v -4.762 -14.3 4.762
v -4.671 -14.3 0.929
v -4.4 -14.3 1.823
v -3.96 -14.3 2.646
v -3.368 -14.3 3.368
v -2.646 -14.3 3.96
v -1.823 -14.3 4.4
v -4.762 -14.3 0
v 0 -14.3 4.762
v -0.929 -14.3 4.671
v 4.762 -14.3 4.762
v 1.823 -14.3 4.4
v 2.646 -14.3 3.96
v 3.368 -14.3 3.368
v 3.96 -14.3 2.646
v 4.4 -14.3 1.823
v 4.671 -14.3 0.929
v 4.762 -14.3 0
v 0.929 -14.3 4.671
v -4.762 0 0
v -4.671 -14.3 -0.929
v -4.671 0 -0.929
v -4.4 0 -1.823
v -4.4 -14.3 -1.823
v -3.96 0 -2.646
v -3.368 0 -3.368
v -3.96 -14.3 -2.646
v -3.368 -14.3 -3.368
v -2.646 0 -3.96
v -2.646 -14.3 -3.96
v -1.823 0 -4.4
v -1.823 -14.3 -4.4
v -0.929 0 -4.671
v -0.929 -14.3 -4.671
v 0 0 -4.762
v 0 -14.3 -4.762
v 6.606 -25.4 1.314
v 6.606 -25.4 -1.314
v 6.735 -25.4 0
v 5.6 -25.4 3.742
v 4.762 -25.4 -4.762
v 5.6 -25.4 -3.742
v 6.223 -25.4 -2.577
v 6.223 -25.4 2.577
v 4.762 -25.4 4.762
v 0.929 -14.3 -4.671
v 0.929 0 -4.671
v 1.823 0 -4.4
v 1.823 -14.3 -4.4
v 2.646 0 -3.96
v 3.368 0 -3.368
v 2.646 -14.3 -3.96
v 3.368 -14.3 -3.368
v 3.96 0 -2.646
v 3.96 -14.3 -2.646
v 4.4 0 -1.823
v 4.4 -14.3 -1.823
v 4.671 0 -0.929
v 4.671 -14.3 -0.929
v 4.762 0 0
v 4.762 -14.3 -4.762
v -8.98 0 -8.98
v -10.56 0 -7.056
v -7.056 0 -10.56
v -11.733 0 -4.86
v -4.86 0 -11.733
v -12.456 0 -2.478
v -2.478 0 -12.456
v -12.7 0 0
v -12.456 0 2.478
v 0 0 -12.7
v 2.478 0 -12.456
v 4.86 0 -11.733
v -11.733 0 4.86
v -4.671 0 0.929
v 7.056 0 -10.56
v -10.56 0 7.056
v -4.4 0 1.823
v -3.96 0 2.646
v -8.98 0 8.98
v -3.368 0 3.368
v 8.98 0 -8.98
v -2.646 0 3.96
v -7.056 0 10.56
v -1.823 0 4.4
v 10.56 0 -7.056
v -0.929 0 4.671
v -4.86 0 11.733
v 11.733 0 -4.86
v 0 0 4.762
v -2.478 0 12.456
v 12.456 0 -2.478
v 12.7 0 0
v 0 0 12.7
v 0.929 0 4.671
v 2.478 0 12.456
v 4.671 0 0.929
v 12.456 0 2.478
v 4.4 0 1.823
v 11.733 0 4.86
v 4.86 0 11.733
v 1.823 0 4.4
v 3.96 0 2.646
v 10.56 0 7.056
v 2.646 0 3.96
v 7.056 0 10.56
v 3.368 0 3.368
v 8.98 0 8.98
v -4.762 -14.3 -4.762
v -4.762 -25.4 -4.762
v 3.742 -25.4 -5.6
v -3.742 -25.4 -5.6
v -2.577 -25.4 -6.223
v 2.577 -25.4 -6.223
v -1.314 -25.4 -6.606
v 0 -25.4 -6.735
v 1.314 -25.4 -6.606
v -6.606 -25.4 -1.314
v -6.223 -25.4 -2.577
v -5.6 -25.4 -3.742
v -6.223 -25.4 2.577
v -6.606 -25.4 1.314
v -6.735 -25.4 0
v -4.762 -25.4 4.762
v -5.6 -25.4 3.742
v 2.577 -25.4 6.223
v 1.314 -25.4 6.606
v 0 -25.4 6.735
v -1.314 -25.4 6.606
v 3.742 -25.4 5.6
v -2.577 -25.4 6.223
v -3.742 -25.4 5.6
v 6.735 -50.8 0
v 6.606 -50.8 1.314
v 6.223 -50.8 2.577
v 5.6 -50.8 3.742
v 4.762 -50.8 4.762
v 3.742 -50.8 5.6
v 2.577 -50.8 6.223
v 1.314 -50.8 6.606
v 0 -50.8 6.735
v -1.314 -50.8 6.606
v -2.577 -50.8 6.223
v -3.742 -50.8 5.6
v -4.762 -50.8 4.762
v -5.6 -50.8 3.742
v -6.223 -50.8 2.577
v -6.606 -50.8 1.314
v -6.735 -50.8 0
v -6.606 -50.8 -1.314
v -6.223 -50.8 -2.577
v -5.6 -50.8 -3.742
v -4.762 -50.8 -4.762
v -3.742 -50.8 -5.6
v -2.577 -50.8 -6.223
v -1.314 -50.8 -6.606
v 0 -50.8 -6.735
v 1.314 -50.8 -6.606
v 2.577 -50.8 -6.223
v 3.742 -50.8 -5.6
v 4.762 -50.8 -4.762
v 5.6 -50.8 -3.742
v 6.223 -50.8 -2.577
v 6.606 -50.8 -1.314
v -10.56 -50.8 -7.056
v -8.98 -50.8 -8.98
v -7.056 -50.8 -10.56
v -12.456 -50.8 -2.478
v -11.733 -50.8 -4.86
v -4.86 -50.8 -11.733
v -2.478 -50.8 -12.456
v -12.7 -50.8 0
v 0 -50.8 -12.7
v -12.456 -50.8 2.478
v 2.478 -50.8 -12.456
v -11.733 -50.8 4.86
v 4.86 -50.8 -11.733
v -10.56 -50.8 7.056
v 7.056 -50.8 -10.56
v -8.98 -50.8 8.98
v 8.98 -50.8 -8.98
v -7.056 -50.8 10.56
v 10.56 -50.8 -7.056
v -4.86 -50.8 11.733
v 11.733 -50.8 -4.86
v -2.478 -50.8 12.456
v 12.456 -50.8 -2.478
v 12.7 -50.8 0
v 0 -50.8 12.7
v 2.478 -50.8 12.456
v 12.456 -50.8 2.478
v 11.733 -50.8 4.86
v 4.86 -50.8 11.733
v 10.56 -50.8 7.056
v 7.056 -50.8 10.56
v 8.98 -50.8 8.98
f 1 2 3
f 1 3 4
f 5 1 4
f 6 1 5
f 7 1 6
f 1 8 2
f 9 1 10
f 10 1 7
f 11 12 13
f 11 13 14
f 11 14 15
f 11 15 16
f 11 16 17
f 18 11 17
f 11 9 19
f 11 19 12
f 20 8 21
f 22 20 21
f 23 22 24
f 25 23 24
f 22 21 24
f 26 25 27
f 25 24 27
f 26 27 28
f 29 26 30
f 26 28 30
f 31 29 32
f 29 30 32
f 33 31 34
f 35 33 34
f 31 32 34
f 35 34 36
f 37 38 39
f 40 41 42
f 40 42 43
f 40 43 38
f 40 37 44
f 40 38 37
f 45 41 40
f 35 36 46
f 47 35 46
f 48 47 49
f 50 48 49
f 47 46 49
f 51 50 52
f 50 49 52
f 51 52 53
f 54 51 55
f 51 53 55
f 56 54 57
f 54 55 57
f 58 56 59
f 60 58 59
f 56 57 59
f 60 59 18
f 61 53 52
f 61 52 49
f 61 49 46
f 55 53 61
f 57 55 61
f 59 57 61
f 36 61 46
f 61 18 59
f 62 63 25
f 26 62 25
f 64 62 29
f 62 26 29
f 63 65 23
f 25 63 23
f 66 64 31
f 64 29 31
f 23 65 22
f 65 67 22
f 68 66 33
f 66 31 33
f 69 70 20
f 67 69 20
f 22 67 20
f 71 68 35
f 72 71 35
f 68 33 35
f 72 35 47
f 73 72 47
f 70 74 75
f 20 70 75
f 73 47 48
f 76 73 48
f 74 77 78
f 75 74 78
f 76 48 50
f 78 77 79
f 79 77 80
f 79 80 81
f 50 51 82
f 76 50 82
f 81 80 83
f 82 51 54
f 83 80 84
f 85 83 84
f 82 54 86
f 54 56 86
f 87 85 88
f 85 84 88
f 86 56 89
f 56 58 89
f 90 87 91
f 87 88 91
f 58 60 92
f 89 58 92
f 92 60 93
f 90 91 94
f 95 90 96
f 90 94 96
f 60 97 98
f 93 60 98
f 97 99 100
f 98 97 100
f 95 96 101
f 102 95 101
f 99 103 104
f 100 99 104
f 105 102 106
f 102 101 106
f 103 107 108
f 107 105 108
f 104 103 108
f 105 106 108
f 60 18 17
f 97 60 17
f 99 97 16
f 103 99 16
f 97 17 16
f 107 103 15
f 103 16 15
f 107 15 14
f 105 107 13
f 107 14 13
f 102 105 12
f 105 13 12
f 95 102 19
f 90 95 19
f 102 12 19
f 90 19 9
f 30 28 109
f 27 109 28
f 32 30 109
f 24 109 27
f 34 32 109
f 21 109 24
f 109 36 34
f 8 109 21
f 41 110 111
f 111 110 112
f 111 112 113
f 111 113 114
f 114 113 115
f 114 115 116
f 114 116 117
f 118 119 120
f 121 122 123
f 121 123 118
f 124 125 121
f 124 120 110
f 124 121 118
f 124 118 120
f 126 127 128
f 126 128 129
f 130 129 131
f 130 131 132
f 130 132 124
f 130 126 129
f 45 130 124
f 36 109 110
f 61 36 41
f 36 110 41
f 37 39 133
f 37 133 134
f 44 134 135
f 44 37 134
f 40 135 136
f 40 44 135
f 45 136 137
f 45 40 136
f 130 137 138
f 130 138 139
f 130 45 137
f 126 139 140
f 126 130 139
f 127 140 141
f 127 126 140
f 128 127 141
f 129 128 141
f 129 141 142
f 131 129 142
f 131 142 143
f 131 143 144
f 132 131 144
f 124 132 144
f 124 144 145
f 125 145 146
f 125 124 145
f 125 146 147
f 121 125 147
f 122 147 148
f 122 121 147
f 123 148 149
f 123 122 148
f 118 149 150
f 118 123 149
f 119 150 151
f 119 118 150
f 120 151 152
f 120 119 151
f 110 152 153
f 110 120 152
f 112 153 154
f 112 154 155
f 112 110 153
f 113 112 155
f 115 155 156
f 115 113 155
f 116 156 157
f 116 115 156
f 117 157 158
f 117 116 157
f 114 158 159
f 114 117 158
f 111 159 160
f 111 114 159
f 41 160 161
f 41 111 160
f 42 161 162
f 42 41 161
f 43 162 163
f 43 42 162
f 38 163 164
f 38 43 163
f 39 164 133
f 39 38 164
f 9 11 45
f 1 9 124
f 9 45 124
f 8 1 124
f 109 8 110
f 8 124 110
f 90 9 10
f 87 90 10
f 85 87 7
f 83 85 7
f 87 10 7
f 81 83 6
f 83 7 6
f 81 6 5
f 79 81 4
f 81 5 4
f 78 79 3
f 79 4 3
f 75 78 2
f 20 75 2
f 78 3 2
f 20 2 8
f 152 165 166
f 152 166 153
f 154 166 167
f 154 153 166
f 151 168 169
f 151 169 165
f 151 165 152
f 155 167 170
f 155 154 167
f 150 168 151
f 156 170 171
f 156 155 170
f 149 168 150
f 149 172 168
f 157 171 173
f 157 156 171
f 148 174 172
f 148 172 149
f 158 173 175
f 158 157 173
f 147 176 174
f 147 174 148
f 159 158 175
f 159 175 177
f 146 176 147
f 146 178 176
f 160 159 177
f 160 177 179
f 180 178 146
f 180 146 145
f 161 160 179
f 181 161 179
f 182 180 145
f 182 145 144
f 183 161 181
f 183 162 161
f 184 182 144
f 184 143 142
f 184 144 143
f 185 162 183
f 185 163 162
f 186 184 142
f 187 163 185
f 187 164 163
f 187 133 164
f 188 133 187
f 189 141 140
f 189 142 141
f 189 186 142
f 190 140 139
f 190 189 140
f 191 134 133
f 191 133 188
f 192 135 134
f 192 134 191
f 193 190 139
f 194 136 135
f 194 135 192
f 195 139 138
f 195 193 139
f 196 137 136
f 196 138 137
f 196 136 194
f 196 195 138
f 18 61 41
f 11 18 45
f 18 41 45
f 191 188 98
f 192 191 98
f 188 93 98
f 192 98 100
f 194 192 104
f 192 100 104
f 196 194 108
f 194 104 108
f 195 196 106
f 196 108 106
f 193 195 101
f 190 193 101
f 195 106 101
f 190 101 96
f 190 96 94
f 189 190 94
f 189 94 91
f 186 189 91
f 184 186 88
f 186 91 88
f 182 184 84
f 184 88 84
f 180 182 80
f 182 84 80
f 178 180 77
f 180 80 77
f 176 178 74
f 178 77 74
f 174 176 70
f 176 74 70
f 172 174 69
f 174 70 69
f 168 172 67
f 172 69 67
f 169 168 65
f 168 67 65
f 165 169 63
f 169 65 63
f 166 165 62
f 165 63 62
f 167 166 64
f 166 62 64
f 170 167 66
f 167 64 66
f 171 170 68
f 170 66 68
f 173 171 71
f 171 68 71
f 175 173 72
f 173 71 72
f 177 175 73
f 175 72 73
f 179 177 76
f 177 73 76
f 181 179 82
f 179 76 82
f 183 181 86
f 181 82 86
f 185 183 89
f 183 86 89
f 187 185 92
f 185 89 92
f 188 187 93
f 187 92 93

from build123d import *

# Parameters (mm, degrees)
F0_R     = 12.7
F1_DEPTH = 25.4
F3_DEPTH = 25.401
F4_DEPTH = 11.0998
F5_R     = 12.7
F5_R_2   = 6.735192
F6_DEPTH = 25.4


with BuildPart() as f1:
    # F0 (on Front) → F1 (new body)
    with BuildSketch(Plane.XZ):
        Circle(F0_R)
    extrude(amount=F1_DEPTH)

    # F2 (on face) → F3 (cut, through all)
    with BuildSketch(Plane.XZ.offset(25.4)):
        with BuildLine():
            ThreePointArc((-4.7625, 0), (-3.367596, -3.367596), (0, -4.7625))
            ThreePointArc((0, -4.7625), (3.367596, -3.367596), (4.7625, 0))
            ThreePointArc((4.7625, 0), (3.367596, 3.367596), (0, 4.7625))
            ThreePointArc((0, 4.7625), (-3.367596, 3.367596), (-4.7625, 0))
        make_face()
    extrude(amount=-F3_DEPTH, mode=Mode.SUBTRACT)

    # F2 (on face) → F4 (cut)
    with BuildSketch(Plane.XZ.offset(25.4)):
        with BuildLine():
            Line((-4.7625, 4.7625), (-4.7625, 0))
            ThreePointArc((-4.7625, 0), (-3.367596, 3.367596), (0, 4.7625))
            Line((0, 4.7625), (-4.7625, 4.7625))
        make_face()
        with BuildLine():
            ThreePointArc((0, 4.7625), (3.367596, 3.367596), (4.7625, 0))
            Line((4.7625, 0), (4.7625, 4.7625))
            Line((4.7625, 4.7625), (0, 4.7625))
        make_face()
        with BuildLine():
            Line((0, -4.7625), (4.7625, -4.7625))
            Line((4.7625, -4.7625), (4.7625, 0))
            ThreePointArc((4.7625, 0), (3.367596, -3.367596), (0, -4.7625))
        make_face()
        with BuildLine():
            Line((-4.7625, -4.7625), (0, -4.7625))
            ThreePointArc((0, -4.7625), (-3.367596, -3.367596), (-4.7625, 0))
            Line((-4.7625, 0), (-4.7625, -4.7625))
        make_face()
    extrude(amount=-F4_DEPTH, mode=Mode.SUBTRACT)

    # F5 (on face) → F6 (join)
    with BuildSketch(Plane.XZ.offset(25.4)):
        Circle(F5_R)
        Circle(F5_R_2, mode=Mode.SUBTRACT)
    extrude(amount=F6_DEPTH)


solid = f1.part
